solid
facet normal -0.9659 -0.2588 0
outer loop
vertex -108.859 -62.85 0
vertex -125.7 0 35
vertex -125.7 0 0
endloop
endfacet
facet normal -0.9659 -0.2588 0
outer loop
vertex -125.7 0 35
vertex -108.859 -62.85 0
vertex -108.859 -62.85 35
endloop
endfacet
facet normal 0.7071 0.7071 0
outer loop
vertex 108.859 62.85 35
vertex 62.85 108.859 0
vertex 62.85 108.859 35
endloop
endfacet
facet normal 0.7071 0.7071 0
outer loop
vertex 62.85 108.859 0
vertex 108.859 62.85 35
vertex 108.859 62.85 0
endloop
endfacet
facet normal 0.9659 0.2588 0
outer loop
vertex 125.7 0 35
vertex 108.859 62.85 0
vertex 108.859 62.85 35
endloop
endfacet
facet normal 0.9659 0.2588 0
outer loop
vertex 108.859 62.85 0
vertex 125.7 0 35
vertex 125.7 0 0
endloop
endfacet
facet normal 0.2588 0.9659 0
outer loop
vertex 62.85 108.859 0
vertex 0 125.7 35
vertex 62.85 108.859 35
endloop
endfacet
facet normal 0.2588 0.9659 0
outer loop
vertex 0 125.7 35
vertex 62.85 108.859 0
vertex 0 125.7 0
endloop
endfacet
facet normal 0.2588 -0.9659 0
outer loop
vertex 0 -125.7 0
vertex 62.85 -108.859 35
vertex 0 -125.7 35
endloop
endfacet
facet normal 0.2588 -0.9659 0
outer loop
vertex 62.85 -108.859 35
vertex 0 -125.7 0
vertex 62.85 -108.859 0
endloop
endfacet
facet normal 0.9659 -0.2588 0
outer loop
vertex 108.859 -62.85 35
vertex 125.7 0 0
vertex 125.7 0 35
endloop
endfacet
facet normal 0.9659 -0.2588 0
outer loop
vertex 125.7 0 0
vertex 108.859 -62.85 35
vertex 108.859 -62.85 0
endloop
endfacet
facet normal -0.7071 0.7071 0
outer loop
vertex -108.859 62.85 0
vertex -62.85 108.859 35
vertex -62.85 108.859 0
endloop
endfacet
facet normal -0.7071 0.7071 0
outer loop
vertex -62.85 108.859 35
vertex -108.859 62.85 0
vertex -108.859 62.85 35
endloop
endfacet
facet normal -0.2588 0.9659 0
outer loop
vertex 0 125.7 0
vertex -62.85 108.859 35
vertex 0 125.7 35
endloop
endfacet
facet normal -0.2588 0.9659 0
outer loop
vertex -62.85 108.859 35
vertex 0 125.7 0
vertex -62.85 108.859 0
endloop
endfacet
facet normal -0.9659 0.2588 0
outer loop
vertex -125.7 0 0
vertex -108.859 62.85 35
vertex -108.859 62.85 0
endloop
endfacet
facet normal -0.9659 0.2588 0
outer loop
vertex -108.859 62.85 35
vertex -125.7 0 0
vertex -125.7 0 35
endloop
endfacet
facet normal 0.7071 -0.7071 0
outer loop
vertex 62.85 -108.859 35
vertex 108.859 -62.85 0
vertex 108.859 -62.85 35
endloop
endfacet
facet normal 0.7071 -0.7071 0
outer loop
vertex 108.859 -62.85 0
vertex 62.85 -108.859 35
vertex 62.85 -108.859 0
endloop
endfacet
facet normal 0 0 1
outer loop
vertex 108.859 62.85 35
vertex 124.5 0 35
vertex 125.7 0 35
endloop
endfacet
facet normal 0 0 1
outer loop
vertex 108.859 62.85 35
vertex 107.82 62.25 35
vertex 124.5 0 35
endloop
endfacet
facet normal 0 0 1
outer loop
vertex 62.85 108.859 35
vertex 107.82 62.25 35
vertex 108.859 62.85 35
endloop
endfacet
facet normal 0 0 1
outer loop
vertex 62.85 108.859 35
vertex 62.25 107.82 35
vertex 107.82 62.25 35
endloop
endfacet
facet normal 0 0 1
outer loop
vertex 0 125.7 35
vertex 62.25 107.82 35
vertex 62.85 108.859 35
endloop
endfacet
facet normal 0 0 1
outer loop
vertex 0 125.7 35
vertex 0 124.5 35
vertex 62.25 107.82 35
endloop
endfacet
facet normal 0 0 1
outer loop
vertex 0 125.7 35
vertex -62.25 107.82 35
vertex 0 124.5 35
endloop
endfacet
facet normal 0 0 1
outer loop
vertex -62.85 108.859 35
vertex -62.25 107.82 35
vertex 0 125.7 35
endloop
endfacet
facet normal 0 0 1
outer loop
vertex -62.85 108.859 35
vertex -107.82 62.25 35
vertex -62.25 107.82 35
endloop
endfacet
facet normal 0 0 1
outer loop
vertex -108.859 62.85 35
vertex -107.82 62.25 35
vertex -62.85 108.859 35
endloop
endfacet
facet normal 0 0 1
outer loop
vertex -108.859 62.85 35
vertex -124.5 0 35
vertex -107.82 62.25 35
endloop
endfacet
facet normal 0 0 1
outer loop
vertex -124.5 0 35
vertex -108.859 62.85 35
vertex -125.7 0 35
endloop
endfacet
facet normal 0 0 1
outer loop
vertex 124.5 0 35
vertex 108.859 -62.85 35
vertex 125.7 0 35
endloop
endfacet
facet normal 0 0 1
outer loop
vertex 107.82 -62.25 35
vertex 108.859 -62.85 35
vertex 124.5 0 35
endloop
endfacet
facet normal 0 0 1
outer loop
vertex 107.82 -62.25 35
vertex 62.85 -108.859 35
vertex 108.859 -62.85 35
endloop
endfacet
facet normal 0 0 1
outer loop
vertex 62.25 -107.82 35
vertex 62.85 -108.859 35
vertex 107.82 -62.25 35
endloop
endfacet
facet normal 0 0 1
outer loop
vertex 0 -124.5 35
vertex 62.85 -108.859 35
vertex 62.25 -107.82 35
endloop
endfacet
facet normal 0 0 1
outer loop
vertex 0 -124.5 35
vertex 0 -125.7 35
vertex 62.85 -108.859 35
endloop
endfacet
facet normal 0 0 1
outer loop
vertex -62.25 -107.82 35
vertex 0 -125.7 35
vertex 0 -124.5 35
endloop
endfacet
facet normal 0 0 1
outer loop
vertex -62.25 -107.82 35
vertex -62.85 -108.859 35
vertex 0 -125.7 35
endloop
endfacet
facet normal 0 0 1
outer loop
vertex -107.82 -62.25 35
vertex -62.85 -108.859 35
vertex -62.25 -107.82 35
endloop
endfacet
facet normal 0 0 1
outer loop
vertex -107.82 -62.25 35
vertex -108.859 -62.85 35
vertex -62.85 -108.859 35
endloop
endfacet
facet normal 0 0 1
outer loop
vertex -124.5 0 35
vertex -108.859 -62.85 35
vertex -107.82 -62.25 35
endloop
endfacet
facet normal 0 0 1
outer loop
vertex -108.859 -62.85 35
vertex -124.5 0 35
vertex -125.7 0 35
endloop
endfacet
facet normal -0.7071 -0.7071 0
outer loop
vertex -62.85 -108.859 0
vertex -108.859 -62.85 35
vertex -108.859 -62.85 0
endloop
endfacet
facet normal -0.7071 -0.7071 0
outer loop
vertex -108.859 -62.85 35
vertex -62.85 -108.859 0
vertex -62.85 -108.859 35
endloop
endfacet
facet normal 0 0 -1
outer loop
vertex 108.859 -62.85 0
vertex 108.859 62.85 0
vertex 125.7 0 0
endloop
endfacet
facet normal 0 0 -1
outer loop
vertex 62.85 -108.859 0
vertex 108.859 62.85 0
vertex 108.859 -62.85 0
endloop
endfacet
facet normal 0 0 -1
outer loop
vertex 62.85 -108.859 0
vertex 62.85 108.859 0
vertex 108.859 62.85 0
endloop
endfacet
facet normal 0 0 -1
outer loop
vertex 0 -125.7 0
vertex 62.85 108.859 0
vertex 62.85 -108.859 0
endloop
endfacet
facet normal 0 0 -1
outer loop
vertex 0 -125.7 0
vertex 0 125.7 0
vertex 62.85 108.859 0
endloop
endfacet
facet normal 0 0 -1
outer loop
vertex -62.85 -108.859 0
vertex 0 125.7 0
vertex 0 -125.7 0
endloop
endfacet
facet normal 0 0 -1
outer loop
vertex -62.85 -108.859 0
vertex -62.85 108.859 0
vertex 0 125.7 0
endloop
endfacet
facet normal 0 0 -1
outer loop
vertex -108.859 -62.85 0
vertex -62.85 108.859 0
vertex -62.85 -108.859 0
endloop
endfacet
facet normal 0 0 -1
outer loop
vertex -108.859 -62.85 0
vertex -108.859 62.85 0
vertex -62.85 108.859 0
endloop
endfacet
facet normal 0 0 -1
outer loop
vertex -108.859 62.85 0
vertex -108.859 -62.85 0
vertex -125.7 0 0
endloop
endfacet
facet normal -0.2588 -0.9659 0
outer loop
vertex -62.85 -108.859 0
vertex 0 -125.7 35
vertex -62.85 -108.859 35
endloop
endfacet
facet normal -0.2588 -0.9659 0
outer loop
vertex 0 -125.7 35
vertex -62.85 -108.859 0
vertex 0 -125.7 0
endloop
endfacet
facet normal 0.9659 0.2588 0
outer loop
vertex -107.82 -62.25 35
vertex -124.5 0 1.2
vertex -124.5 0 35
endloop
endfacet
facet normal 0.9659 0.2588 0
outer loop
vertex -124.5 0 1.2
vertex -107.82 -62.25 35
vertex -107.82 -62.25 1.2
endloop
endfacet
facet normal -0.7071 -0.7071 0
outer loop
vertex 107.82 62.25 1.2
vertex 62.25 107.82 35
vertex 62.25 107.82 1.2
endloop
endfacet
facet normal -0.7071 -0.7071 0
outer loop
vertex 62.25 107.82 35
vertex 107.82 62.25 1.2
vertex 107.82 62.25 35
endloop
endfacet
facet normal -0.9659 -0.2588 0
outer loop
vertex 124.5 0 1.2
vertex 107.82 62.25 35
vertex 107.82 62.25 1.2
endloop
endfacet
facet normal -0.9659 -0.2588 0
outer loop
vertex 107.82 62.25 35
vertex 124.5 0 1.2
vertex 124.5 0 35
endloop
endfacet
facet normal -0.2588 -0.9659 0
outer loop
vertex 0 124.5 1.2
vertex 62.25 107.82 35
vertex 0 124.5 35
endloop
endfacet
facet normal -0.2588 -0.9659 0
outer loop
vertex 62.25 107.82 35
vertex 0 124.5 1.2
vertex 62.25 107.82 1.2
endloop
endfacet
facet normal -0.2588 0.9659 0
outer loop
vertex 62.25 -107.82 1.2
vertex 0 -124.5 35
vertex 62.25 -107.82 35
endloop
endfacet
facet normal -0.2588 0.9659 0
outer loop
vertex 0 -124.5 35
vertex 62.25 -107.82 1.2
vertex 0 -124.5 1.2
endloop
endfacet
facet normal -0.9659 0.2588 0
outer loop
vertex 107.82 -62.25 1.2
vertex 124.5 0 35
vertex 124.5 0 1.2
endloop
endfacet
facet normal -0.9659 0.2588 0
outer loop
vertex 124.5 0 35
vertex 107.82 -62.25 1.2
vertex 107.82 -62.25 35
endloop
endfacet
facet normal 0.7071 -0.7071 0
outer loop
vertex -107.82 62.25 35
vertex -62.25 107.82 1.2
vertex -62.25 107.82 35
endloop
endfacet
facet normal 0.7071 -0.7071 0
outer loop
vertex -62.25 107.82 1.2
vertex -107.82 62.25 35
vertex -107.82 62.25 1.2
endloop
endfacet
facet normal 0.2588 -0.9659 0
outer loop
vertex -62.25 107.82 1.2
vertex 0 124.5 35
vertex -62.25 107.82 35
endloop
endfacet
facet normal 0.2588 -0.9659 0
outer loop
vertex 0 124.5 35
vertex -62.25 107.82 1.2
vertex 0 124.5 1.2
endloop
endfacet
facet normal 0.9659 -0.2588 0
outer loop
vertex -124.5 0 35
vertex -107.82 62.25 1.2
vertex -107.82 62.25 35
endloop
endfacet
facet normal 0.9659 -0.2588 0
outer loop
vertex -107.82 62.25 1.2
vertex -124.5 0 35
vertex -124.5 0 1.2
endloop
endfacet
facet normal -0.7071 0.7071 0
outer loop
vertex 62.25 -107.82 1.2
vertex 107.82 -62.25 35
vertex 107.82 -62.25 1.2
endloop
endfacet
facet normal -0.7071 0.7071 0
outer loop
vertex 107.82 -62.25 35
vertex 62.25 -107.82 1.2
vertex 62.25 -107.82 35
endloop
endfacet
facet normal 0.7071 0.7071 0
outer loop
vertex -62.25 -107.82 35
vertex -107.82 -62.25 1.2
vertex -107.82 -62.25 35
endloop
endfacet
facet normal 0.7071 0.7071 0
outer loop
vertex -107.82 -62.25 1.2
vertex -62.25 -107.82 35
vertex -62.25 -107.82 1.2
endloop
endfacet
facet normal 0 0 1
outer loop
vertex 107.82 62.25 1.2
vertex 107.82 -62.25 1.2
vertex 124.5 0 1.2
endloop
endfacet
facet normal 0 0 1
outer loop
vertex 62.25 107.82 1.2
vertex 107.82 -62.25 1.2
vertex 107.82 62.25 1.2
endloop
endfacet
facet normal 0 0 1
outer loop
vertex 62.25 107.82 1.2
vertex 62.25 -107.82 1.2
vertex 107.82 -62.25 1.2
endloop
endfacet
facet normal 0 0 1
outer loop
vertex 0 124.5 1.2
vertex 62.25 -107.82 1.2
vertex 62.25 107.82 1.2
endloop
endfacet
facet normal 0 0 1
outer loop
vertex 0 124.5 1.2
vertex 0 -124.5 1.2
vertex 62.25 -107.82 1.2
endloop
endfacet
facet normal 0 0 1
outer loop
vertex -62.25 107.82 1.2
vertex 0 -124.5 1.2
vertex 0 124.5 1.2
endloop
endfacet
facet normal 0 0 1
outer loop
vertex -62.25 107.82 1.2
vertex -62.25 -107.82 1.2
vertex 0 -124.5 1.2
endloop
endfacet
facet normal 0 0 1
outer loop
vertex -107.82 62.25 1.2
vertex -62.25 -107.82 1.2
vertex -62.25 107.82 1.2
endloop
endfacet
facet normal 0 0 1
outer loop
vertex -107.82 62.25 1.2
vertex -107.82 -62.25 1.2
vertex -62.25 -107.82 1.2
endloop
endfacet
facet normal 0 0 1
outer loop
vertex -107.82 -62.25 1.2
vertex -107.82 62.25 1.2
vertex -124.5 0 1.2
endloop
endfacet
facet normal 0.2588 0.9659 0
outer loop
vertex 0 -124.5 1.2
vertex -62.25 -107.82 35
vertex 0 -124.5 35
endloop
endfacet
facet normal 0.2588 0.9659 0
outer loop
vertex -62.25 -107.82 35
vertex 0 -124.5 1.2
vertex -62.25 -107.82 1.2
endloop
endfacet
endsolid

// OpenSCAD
// =============================================
// 3D: Round Box
// Version: 1.0
// Author: generator
// =============================================

description = "Round box with cap, inner diam 250mm, height 35mm, wall 1mm";
version_str = "1.0";

// ===== Комментарии ===========================
/*
Модель: круглая коробка с крышкой для хранения
Блоки:
- Переменные (вверху) для всех размеров
- Комментарии (этот блок)
- Функции фрагментов детали (ниже)
- Функция вывода всех фрагментов show_all()
- Функция обрезки через intersection при test_fragment=true

Детали: base (коробка), cap (крышка)
План: 
- base: цилиндрический контейнер с дном и стенками
- cap: плоский диск с цилиндрической юбкой, надевается на коробку
*/

use <../modules.scad>;

// ===== Точность аппроксимации окружностей =====
$fn = 0;        // фиксированную сегментацию отключаем
$fa = 1;        // 5–8° обычно достаточно
$fs = 0.35;     // ≈ диаметр сопла (0.3–0.5 для сопла 0.4)
pin_fs = 0.25;  // чуть тоньше для штырей и отверстий
model_fa = 32; // угол округления коробки, 1 - круглая, 24 - 16 граней, 32 - 12 граней

// ===== Режим печати тест‑фрагментов =====
test_fragment = false;   // true — печатать только угловые фрагменты
frag_size     = 20;     // размер квадрата вырезки, мм
frag_index    = 0;      // 0=НЛ, 1=ВЛ, 2=НП, 3=ВП (относительно основания)
frag_gap_x    = 10;     // зазор между фрагментами по X, мм
frag_h_extra  = 20;     // запас по высоте клипа, мм

// ===== Общие доп. параметры =====
tiny = 0.1;                  // небольшой зазор для булевых операций
edge_chamfer_z = 1;       // высота фаски по Z (мм)
edge_chamfer_x = 5;       // горизонтальный вылет фаски по X (с каждой стороны), мм
edge_chamfer_y = 5;       // горизонтальный вылет фаски по Y (с каждой стороны), мм
screen_frame_gap = 0.1;      // только для высоты вычитаний в рамке (не влияет на XY)
wall_th = 1.2;

// ===== Параметры модели =====
// Размеры коробки
box_inner_diam = 249;     // внутренний диаметр коробки, мм
box_height     = 35;      // высота коробки, мм
box_wall_th    = wall_th;       // толщина стенок коробки, мм
box_bottom_th  = wall_th;       // толщина дна коробки, мм

// Размеры крышки
cap_wall_th    = wall_th;       // толщина стенок крышки, мм
cap_top_th     = wall_th;       // толщина верхней части крышки, мм
cap_lip_h      = 10;      // высота юбки крышки (глубина посадки), мм
cap_fit_gap    = 0.00;     // зазор посадки крышки на коробку, мм
test_cut_d     = 20;      // диаметр вырезки в середине cap_inner_d для тестирования, мм
print_test_cut = false;   // true - делать вырез в середине cap_inner_d - test_cut_d

// Включение деталей для вывода
print_base = true;        // печатать коробку
print_cap  = false;        // печатать крышку

// ===== Вычисляемые размеры =====
box_inner_r = box_inner_diam / 2;
box_outer_diam = box_inner_diam + 2 * box_wall_th;
box_outer_r = box_outer_diam / 2;

cap_inner_diam = box_outer_diam + 2 * cap_fit_gap;
cap_inner_r = cap_inner_diam / 2;
cap_outer_diam = cap_inner_diam + 2 * cap_wall_th;
cap_outer_r = cap_outer_diam / 2;
cap_total_h = cap_top_th + cap_lip_h;

// Для совместимости с clip_for_fragments()
base_h = box_height;

// ===== Вспомогательные функции ====================
function clamp(val, lo, hi) = max(lo, min(val, hi));
function clamp_chz(t, chz) = clamp(chz, 0, t/2);

// ===== Модули деталей ====================
// Коробка: цилиндрический контейнер с дном и стенками
module base() {
  difference() {
    // Внешний цилиндр коробки
    cylinder(h=box_height, d=box_outer_diam, $fs=pin_fs, $fa=model_fa);
    // Внутренняя полость
    translate([0, 0, box_bottom_th])
      cylinder(h=box_height - box_bottom_th + tiny, d=box_inner_diam, $fs=pin_fs, $fa=model_fa);
    // Опциональный тестовый вырез в центре
    if (print_test_cut) {
      translate([0, 0, 0])
        cylinder(h=box_height + tiny, d=box_inner_diam - test_cut_d, $fs=pin_fs, $fa=model_fa);
    }
  }
}

// Крышка: плоский диск с цилиндрической юбкой
module cap() {
  difference() {
    // Внешний объём крышки
    cylinder(h=cap_total_h, d=cap_outer_diam, $fs=pin_fs, $fa=model_fa);
    // Внутренняя полость (юбка для посадки на коробку)
    translate([0, 0, cap_top_th])
      cylinder(h=cap_lip_h + tiny, d=cap_inner_diam, $fs=pin_fs, $fa=model_fa);
    // Опциональный тестовый вырез в центре
    if (print_test_cut) {
      translate([0, 0, 0])
        cylinder(h=cap_total_h + tiny, d=cap_inner_diam - test_cut_d, $fs=pin_fs, $fa=model_fa);
    }
  }
}

// ===== Вывод всех фрагментов ====================
module show_all() {
  if (print_base) base();
  if (print_cap) {
    translate([box_outer_diam + 20, 0, 0]) cap();
  }
}

// ===== Точка входа ====================
clip_for_fragments() show_all();
